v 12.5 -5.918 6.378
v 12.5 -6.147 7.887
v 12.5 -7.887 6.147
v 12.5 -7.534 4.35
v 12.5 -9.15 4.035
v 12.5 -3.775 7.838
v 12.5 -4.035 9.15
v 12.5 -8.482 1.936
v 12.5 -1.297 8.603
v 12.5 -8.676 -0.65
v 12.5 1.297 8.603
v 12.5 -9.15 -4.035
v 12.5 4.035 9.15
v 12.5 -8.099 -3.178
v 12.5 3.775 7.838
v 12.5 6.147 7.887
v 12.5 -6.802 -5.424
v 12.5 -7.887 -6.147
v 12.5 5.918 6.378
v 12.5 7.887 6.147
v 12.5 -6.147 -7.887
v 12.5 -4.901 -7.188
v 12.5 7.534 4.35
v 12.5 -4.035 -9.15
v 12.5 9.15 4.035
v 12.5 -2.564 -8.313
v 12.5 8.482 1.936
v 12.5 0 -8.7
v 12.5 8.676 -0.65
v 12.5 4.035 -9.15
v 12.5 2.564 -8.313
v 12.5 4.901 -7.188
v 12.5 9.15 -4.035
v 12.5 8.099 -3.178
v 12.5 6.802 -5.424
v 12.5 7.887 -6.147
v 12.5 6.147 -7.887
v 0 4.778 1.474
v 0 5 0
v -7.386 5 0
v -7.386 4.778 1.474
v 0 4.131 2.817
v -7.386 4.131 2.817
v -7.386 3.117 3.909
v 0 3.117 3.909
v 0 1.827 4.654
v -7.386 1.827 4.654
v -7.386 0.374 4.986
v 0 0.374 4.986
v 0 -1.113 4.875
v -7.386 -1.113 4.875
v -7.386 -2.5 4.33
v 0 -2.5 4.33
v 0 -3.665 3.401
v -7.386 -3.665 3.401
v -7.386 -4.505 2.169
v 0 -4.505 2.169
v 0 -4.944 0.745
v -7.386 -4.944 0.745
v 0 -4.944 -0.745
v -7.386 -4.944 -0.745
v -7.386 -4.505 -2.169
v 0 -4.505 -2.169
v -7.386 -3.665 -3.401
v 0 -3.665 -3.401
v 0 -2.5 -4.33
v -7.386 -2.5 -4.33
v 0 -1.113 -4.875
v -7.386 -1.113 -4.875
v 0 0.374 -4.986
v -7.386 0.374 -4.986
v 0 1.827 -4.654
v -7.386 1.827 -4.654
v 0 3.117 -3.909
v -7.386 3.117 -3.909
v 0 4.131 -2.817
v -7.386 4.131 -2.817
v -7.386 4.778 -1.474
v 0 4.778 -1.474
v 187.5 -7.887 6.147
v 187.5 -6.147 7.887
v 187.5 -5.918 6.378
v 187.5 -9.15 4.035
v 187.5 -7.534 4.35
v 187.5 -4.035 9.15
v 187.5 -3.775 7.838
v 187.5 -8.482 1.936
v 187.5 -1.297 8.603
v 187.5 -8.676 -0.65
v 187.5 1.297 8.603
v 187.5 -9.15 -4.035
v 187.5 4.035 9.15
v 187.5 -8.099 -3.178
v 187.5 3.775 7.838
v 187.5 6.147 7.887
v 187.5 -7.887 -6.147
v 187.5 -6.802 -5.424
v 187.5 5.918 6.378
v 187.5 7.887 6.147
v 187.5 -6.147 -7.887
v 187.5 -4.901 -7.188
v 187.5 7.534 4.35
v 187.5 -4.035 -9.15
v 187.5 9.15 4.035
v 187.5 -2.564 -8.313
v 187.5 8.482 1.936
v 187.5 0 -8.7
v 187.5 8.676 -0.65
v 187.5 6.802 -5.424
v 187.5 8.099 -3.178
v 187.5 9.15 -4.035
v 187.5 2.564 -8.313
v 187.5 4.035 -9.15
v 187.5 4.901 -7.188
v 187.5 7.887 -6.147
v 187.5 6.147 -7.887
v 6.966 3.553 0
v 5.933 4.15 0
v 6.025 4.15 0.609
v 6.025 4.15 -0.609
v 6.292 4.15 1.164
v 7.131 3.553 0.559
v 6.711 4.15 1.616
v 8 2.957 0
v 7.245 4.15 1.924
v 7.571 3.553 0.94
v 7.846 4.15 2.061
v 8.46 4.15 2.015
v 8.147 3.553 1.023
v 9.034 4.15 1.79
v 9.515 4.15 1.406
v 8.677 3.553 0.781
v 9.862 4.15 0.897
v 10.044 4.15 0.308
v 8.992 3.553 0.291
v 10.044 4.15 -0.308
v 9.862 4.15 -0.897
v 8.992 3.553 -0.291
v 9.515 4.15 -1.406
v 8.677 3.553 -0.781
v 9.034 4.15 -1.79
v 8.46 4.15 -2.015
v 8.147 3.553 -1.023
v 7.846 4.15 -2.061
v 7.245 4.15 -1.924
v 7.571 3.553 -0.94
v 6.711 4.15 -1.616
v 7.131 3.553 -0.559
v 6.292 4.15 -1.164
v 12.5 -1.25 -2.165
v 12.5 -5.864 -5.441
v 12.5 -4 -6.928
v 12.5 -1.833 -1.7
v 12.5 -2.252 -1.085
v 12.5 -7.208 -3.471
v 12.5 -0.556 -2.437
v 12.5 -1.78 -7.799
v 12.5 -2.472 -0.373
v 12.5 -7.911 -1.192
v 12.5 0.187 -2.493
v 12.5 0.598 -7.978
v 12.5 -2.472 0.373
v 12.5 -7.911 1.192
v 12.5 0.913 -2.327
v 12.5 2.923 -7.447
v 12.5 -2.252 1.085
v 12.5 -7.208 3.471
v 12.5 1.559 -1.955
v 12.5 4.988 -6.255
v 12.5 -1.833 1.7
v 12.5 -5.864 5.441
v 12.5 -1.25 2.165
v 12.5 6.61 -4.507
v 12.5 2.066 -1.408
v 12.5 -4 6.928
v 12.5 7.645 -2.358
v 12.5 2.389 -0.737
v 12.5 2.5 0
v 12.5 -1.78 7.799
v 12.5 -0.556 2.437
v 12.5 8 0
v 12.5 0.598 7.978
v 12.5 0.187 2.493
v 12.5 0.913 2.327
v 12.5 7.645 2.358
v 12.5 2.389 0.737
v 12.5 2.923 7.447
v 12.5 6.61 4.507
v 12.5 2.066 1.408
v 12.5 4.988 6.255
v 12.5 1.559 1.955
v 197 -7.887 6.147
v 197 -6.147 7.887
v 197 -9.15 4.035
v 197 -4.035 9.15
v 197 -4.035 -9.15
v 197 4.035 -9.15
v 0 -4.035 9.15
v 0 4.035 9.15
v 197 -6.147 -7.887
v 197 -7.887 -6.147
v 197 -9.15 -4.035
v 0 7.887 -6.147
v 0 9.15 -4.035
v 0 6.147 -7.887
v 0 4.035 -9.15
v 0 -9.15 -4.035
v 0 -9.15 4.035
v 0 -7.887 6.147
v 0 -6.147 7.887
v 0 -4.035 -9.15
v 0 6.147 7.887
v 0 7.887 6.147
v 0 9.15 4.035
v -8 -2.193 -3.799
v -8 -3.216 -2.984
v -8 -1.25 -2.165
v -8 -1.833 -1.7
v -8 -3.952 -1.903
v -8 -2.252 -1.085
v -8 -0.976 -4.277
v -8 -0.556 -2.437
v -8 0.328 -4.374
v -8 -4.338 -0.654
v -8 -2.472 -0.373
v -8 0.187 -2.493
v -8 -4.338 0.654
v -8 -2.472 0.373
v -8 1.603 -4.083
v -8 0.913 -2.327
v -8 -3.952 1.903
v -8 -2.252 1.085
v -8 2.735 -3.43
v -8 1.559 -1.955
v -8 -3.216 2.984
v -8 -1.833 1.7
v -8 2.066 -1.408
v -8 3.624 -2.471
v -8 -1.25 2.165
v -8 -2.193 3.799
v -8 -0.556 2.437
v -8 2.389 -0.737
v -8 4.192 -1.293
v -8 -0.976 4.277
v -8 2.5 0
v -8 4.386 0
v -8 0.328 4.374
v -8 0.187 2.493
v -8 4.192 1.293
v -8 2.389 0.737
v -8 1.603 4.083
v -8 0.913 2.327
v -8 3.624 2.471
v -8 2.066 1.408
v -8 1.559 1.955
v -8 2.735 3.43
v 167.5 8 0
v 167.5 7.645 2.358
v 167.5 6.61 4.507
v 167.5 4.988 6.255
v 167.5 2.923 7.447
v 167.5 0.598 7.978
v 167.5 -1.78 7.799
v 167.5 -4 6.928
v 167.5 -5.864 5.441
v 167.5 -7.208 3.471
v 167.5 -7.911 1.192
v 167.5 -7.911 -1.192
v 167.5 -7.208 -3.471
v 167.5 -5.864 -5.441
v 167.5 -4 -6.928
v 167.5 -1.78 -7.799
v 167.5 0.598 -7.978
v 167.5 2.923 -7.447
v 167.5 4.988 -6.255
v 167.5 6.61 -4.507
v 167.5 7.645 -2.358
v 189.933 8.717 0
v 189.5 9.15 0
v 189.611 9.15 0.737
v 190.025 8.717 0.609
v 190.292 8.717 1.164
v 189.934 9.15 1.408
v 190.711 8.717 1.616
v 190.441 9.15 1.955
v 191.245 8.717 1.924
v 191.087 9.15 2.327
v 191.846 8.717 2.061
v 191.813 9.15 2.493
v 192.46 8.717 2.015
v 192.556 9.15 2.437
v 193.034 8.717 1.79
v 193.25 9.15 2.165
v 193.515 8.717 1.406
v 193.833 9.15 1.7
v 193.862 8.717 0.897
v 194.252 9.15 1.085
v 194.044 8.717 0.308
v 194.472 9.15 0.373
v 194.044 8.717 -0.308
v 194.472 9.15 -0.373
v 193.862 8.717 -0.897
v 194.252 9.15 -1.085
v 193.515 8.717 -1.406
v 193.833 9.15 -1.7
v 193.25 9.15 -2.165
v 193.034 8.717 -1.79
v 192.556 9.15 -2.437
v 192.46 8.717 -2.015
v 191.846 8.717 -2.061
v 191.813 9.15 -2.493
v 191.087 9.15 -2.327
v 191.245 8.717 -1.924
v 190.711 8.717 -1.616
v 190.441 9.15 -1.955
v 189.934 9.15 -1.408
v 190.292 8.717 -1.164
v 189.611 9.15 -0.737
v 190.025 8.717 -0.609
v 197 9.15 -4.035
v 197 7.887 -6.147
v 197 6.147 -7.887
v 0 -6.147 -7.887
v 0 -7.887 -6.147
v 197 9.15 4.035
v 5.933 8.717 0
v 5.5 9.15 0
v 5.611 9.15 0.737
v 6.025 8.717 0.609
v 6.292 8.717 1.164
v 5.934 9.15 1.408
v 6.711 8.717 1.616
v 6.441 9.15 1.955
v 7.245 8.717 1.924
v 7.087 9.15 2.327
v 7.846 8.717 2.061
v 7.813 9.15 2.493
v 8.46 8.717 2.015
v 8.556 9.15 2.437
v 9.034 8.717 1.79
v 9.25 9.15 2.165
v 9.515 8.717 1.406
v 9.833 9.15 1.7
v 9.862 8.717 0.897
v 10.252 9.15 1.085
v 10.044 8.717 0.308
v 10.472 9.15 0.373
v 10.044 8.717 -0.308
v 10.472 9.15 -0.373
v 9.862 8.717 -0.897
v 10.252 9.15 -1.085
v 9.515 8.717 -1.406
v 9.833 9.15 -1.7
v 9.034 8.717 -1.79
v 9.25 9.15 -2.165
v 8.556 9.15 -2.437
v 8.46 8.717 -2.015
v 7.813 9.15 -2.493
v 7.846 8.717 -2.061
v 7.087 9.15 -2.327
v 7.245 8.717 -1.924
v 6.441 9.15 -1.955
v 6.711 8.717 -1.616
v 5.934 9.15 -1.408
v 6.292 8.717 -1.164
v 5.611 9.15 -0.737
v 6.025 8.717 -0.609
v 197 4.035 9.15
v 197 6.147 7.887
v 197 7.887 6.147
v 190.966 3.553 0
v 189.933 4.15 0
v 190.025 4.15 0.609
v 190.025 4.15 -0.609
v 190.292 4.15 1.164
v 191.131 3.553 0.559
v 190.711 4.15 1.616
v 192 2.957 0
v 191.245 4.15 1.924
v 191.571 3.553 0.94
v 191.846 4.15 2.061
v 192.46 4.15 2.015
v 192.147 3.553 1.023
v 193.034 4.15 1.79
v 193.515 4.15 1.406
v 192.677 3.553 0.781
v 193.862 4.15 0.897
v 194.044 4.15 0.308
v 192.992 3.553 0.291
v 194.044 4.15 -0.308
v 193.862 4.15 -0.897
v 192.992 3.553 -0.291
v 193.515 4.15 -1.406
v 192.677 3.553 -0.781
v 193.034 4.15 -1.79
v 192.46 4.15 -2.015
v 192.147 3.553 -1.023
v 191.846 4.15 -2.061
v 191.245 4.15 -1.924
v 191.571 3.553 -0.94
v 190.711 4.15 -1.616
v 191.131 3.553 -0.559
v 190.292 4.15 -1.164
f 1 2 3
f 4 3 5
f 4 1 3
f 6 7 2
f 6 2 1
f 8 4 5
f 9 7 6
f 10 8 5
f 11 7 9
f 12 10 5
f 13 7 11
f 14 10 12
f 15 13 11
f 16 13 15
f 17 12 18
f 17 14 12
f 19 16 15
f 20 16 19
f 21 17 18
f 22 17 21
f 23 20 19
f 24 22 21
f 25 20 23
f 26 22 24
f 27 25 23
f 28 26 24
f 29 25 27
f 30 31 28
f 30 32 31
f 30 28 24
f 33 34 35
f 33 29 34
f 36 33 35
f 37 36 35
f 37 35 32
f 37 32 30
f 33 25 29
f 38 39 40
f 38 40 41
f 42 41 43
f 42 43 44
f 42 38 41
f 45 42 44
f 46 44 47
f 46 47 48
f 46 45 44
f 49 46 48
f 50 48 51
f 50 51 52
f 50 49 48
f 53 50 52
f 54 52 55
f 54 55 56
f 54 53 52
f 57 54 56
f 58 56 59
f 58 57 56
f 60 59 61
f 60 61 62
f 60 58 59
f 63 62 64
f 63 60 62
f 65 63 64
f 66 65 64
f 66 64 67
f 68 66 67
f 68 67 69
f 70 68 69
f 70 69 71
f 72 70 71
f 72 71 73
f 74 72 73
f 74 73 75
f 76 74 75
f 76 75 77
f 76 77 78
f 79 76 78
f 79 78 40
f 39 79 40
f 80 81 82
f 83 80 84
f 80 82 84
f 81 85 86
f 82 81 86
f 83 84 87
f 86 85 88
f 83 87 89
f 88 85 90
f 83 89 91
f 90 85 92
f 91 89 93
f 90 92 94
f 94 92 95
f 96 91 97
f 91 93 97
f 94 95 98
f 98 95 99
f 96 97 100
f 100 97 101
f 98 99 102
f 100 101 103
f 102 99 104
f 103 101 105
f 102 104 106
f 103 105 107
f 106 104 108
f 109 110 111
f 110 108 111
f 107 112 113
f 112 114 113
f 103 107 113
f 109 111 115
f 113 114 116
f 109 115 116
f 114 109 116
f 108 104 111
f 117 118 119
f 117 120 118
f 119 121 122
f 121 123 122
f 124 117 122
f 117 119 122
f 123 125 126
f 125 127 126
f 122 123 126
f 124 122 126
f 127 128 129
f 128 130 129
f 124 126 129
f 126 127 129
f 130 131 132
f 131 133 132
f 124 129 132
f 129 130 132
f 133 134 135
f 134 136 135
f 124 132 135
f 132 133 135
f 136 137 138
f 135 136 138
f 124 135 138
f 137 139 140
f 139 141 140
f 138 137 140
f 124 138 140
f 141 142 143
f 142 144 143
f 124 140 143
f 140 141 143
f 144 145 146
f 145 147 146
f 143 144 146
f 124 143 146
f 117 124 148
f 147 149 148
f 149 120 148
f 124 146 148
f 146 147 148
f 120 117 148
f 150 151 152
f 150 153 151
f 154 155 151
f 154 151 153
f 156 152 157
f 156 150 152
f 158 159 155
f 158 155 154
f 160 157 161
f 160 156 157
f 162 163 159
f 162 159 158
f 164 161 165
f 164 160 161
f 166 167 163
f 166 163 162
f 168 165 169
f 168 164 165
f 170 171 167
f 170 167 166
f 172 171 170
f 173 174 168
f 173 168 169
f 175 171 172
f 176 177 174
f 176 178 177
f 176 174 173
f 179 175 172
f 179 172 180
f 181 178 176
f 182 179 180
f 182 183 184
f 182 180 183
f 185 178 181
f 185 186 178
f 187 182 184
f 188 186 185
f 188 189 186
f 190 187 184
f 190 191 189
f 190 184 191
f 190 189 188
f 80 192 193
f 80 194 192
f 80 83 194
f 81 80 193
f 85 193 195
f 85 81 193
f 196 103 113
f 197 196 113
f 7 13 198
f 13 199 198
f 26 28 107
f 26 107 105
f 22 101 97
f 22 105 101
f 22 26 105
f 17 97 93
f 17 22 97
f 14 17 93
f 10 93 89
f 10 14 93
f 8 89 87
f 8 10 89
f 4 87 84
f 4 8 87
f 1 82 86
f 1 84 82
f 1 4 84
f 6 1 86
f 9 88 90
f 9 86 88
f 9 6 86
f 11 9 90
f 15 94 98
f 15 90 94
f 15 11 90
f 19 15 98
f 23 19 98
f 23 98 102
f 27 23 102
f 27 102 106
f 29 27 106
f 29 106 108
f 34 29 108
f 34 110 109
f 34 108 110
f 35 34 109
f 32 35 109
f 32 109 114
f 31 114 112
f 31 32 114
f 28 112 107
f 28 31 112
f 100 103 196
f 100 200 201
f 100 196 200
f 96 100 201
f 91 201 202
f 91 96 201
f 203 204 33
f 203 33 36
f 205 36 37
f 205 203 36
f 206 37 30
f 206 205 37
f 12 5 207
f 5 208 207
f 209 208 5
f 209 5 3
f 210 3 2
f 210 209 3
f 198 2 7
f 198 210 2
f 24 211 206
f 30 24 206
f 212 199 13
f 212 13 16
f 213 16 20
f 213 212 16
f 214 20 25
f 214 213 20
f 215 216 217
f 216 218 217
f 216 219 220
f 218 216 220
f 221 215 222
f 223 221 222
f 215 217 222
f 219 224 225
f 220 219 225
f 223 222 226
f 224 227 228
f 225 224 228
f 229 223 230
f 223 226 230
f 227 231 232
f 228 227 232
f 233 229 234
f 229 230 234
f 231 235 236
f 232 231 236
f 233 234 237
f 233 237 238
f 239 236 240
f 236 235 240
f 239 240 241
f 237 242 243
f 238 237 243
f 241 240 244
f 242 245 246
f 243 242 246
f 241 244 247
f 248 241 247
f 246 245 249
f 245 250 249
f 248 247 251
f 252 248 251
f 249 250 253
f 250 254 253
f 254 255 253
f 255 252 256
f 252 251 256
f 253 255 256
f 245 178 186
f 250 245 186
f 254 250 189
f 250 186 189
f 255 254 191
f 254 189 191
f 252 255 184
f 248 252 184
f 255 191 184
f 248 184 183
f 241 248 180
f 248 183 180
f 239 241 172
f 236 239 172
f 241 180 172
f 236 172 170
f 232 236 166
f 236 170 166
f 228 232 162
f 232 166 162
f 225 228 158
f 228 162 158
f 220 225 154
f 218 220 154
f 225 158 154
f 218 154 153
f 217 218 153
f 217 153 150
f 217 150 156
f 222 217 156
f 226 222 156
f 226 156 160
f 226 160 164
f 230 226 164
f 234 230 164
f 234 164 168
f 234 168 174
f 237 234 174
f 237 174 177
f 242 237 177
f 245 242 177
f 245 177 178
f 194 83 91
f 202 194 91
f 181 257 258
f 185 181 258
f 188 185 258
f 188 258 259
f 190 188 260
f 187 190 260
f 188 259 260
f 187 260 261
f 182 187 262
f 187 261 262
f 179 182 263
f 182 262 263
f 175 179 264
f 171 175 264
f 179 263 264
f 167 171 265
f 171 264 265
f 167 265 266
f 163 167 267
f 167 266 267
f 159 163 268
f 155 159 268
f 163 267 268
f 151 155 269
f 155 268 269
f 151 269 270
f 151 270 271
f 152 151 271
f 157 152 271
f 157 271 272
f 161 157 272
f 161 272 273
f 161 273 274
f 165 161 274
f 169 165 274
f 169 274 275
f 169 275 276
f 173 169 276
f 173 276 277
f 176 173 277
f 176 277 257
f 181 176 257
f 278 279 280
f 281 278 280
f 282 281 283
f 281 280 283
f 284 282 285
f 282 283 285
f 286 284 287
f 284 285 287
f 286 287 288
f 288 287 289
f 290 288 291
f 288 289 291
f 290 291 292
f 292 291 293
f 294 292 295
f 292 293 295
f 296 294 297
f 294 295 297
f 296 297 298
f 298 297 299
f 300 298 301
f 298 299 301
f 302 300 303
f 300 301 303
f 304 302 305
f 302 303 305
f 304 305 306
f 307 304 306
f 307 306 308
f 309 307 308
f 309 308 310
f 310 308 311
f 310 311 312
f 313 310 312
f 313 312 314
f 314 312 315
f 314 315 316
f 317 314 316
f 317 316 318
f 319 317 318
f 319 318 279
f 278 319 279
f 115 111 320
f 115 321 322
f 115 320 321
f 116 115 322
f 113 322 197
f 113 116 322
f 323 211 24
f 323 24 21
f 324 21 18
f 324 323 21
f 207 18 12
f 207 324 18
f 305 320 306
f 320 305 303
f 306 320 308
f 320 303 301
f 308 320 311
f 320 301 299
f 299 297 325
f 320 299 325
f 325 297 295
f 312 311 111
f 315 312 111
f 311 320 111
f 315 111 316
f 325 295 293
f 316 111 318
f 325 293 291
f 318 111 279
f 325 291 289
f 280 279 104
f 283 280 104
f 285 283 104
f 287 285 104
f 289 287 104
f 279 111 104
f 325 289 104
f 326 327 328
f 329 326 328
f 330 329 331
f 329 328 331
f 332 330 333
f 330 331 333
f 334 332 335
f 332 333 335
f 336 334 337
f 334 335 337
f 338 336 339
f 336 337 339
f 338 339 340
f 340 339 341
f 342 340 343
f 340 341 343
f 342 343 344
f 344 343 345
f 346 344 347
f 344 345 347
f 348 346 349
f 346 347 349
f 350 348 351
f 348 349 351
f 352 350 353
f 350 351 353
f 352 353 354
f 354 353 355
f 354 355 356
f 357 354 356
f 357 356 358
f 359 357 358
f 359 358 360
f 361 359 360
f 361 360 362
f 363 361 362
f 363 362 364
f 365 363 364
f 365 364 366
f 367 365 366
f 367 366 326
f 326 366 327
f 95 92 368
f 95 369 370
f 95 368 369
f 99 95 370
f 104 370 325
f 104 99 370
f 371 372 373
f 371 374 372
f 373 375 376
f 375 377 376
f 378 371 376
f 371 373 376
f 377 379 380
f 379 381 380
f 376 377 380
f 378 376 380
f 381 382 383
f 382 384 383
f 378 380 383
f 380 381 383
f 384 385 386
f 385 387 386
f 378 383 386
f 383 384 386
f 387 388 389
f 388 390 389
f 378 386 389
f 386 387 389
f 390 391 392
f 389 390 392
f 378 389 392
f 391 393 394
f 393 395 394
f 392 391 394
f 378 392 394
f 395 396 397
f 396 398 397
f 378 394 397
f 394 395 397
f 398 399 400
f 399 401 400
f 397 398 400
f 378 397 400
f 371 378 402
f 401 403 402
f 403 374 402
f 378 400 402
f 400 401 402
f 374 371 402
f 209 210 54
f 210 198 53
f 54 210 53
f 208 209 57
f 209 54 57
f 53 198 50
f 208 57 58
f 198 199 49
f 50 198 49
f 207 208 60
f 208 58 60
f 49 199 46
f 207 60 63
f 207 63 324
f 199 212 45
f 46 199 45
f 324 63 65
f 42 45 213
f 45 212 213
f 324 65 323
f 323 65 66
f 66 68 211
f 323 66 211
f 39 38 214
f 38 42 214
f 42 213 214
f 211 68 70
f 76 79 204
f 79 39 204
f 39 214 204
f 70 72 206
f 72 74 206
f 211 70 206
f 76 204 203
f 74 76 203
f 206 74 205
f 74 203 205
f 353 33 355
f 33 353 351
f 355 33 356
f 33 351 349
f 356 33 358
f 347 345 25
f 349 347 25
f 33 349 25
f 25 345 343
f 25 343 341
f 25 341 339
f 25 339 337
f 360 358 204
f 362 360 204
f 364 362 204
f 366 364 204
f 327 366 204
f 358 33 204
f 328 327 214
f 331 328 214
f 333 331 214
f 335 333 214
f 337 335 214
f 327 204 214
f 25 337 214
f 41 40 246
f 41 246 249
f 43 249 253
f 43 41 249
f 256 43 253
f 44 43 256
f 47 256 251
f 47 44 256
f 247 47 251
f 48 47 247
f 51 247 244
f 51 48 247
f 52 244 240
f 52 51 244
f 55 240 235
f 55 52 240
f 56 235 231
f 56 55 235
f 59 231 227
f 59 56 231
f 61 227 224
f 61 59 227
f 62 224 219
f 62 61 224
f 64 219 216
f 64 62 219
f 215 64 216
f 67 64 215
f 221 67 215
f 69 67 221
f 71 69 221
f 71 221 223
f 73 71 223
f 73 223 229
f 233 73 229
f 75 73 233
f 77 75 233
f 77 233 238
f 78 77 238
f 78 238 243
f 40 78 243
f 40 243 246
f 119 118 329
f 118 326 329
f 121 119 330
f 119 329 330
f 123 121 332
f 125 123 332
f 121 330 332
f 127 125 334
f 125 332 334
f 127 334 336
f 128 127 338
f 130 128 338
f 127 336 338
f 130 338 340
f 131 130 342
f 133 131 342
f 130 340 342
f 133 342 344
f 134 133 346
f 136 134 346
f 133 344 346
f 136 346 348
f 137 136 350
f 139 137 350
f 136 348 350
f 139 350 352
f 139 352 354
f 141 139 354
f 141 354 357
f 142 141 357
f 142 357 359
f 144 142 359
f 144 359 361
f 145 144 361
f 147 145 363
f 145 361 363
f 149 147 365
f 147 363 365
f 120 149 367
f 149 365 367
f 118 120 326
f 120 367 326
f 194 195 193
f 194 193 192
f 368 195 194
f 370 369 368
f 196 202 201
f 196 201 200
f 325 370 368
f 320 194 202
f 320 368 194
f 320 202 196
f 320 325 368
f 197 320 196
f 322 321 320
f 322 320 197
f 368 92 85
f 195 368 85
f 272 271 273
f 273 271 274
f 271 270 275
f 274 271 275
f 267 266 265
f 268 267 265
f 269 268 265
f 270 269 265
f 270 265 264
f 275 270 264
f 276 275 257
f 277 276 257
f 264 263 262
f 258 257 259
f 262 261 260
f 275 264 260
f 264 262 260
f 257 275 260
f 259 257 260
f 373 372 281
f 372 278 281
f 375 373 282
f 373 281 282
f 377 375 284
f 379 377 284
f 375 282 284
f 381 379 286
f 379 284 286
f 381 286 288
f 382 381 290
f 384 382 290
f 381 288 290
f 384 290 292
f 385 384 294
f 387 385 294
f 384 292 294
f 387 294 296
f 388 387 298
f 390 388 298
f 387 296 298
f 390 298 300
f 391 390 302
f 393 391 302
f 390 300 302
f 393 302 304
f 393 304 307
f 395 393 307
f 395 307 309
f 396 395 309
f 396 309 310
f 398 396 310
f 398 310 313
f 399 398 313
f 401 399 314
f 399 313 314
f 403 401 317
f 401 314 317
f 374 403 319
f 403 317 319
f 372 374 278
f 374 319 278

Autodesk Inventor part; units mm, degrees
sketch "Sketch_8" plane through (0, 0, 0) normal (0, 0, 1) x (1, 0, 0)
  line L0 (0, 0) -> (-8, 0)
  line L1 (-8, 0) -> (-8, 4.3865)
  line L2 (-8, 4.3865) -> (-7.3865, 5)
  line L3 (-7.3865, 5) -> (0, 5)
  line L4 (0, 5) -> (0, 0)
  line L5 (0, 0) -> (-8, 0)
revolve "Revolution1" add sketch "Sketch_8" angle 360 about axis through (0, 0, 0) along (1, 0, 0)
thread "Thread1" size "M10x1" class "6g" standard "ISO Metric profile" length 5.8865
sketch "Sketch_9" plane through (0, 0, 0) normal (1, 0, 0) x (0, 0, -1)
  line L0 (-9.15, 4.0345) -> (-9.15, -4.0345)
  arc A0 (-9.15, -4.0345) -> (-4.0345, -9.15) centre (0, 0) ccw
  line L1 (-4.0345, -9.15) -> (4.0345, -9.15)
  arc A1 (4.0345, -9.15) -> (9.15, -4.0345) centre (0, 0) ccw
  line L2 (9.15, -4.0345) -> (9.15, 4.0345)
  arc A2 (9.15, 4.0345) -> (4.0345, 9.15) centre (0, 0) ccw
  line L3 (4.0345, 9.15) -> (-4.0345, 9.15)
  arc A3 (-4.0345, 9.15) -> (-9.15, 4.0345) centre (0, 0) ccw
extrude "Extrusion1" add sketch "Sketch_9" along normal blind 12.5
sketch "Sketch_11" plane through (12.5, 0, 0) normal (1, 0, 0) x (0, 0, -1)
  circle A0 centre (0, 0) radius 8.7
extrude "Extrusion2" add sketch "Sketch_11" along normal blind 175
sketch "Sketch_10" plane through (187.5, 0, 0) normal (1, 0, 0) x (0, 0, -1)
  line L0 (-9.15, 4.0345) -> (-9.15, -4.0345)
  arc A0 (-9.15, -4.0345) -> (-4.0345, -9.15) centre (0, 0) ccw
  line L1 (-4.0345, -9.15) -> (4.0345, -9.15)
  arc A1 (4.0345, -9.15) -> (9.15, -4.0345) centre (0, 0) ccw
  line L2 (9.15, -4.0345) -> (9.15, 4.0345)
  arc A2 (9.15, 4.0345) -> (4.0345, 9.15) centre (0, 0) ccw
  line L3 (4.0345, 9.15) -> (-4.0345, 9.15)
  arc A3 (-4.0345, 9.15) -> (-9.15, 4.0345) centre (0, 0) ccw
extrude "Extrusion3" add sketch "Sketch_10" along normal blind 9.5
sketch "Sketch7" plane through (0, 0, 0) normal (0, 0, 1) x (1, 0, 0)
  line L0 (8, 9.15) -> (8, 4.15)
  line L1 (8, 2.9566) -> (5.933, 4.15)
  line L2 (5.933, 4.15) -> (5.933, 8.717)
  line L3 (5.933, 8.717) -> (5.5, 9.15)
  line L4 (5.5, 9.15) -> (8, 9.15)
  line L5 (8, 9.15) -> (8, 2.9566)
revolve "Revolution2" cut sketch "Sketch7" angle 360 about axis through (8, 9.15, 0) along (0, 1, 0)
thread "Thread2" size "M5x0.8" class "6H" standard "ISO Metric profile" full length
sketch "Sketch_7" plane through (0, 0, 0) normal (0, 0, 1) x (1, 0, 0)
  line L0 (192, 9.15) -> (192, 4.15)
  line L1 (192, 2.9566) -> (189.933, 4.15)
  line L2 (189.933, 4.15) -> (189.933, 8.717)
  line L3 (189.933, 8.717) -> (189.5, 9.15)
  line L4 (189.5, 9.15) -> (192, 9.15)
  line L5 (192, 9.15) -> (192, 2.9566)
revolve "Revolution3" cut sketch "Sketch_7" angle 360 about axis through (192, 9.15, 0) along (0, 1, 0)
thread "Thread3" size "M5x0.8" class "6H" standard "ISO Metric profile" full length
sketch "Sketch_16" plane through (0, 0, 0) normal (0, 0, 1) x (1, 0, 0)
  line L0 (167.5, 0) -> (-8, 0)
  line L1 (-8, 0) -> (-8, 2.5)
  line L2 (-8, 2.5) -> (12.5, 2.5)
  line L3 (12.5, 2.5) -> (12.5, 8)
  line L4 (12.5, 8) -> (167.5, 8)
  line L5 (167.5, 8) -> (167.5, 0)
  line L6 (167.5, 0) -> (-8, 0)
revolve "Revolution4" cut sketch "Sketch_16" angle 360 about axis through (167.5, 0, 0) along (1, 0, 0)
ref_plane "BODY_N_XY" through (197, 0, 0) normal (0, 0, -1) x (1, 0, 0)
ref_plane "BODY_N_YZ" through (197, 0, 0) normal (1, 0, 0) x (0, -1, 0)
ref_plane "BODY_N_ZX" through (197, 0, 0) normal (0, -1, 0) x (0, 0, -1)
ref_plane "NUT2_XY" through (197, 0, 0) normal (1, 0, 0) x (0, 0, -1)
ref_plane "NUT2_YZ" through (197, 0, 0) normal (0, 0, -1) x (0, 1, 0)
ref_plane "NUT2_ZX" through (197, 0, 0) normal (0, 1, 0) x (1, 0, 0)
ref_plane "SW1_XY" through (17.5, 0, 0) normal (1, 0, 0) x (0, 0, -1)
ref_plane "SW1_YZ" through (17.5, 0, 0) normal (0, 0, -1) x (0, 1, 0)
ref_plane "SW1_ZX" through (17.5, 0, 0) normal (0, 1, 0) x (1, 0, 0)
ref_plane "SW2_XY" through (182.5, 0, 0) normal (-1, 0, 0) x (0, 0, -1)
ref_plane "SW2_YZ" through (182.5, 0, 0) normal (0, 0, -1) x (0, -1, 0)
ref_plane "SW2_ZX" through (182.5, 0, 0) normal (0, -1, 0) x (-1, 0, 0)
ref_plane "SW_R1_XY" through (17.5, -14.15, 0) normal (1, 0, 0) x (0, 0, -1)
ref_plane "SW_R1_YZ" through (17.5, -14.15, 0) normal (0, 0, -1) x (0, 1, 0)
ref_plane "SW_R1_ZX" through (17.5, -14.15, 0) normal (0, 1, 0) x (1, 0, 0)
ref_plane "SW_R2_XY" through (182.5, -14.15, 0) normal (-1, 0, 0) x (0, 0, -1)
ref_plane "SW_R2_YZ" through (182.5, -14.15, 0) normal (0, 0, -1) x (0, -1, 0)
ref_plane "SW_R2_ZX" through (182.5, -14.15, 0) normal (0, -1, 0) x (-1, 0, 0)
ref_plane "body_XY" through (0, 0, 0) normal (1, 0, 0) x (0, 0, -1)
ref_plane "body_YZ" through (0, 0, 0) normal (0, 0, -1) x (0, 1, 0)
ref_plane "body_ZX" through (0, 0, 0) normal (0, 1, 0) x (1, 0, 0)
properties part number "CJ2B16-150Z(1_0)_BODY"
